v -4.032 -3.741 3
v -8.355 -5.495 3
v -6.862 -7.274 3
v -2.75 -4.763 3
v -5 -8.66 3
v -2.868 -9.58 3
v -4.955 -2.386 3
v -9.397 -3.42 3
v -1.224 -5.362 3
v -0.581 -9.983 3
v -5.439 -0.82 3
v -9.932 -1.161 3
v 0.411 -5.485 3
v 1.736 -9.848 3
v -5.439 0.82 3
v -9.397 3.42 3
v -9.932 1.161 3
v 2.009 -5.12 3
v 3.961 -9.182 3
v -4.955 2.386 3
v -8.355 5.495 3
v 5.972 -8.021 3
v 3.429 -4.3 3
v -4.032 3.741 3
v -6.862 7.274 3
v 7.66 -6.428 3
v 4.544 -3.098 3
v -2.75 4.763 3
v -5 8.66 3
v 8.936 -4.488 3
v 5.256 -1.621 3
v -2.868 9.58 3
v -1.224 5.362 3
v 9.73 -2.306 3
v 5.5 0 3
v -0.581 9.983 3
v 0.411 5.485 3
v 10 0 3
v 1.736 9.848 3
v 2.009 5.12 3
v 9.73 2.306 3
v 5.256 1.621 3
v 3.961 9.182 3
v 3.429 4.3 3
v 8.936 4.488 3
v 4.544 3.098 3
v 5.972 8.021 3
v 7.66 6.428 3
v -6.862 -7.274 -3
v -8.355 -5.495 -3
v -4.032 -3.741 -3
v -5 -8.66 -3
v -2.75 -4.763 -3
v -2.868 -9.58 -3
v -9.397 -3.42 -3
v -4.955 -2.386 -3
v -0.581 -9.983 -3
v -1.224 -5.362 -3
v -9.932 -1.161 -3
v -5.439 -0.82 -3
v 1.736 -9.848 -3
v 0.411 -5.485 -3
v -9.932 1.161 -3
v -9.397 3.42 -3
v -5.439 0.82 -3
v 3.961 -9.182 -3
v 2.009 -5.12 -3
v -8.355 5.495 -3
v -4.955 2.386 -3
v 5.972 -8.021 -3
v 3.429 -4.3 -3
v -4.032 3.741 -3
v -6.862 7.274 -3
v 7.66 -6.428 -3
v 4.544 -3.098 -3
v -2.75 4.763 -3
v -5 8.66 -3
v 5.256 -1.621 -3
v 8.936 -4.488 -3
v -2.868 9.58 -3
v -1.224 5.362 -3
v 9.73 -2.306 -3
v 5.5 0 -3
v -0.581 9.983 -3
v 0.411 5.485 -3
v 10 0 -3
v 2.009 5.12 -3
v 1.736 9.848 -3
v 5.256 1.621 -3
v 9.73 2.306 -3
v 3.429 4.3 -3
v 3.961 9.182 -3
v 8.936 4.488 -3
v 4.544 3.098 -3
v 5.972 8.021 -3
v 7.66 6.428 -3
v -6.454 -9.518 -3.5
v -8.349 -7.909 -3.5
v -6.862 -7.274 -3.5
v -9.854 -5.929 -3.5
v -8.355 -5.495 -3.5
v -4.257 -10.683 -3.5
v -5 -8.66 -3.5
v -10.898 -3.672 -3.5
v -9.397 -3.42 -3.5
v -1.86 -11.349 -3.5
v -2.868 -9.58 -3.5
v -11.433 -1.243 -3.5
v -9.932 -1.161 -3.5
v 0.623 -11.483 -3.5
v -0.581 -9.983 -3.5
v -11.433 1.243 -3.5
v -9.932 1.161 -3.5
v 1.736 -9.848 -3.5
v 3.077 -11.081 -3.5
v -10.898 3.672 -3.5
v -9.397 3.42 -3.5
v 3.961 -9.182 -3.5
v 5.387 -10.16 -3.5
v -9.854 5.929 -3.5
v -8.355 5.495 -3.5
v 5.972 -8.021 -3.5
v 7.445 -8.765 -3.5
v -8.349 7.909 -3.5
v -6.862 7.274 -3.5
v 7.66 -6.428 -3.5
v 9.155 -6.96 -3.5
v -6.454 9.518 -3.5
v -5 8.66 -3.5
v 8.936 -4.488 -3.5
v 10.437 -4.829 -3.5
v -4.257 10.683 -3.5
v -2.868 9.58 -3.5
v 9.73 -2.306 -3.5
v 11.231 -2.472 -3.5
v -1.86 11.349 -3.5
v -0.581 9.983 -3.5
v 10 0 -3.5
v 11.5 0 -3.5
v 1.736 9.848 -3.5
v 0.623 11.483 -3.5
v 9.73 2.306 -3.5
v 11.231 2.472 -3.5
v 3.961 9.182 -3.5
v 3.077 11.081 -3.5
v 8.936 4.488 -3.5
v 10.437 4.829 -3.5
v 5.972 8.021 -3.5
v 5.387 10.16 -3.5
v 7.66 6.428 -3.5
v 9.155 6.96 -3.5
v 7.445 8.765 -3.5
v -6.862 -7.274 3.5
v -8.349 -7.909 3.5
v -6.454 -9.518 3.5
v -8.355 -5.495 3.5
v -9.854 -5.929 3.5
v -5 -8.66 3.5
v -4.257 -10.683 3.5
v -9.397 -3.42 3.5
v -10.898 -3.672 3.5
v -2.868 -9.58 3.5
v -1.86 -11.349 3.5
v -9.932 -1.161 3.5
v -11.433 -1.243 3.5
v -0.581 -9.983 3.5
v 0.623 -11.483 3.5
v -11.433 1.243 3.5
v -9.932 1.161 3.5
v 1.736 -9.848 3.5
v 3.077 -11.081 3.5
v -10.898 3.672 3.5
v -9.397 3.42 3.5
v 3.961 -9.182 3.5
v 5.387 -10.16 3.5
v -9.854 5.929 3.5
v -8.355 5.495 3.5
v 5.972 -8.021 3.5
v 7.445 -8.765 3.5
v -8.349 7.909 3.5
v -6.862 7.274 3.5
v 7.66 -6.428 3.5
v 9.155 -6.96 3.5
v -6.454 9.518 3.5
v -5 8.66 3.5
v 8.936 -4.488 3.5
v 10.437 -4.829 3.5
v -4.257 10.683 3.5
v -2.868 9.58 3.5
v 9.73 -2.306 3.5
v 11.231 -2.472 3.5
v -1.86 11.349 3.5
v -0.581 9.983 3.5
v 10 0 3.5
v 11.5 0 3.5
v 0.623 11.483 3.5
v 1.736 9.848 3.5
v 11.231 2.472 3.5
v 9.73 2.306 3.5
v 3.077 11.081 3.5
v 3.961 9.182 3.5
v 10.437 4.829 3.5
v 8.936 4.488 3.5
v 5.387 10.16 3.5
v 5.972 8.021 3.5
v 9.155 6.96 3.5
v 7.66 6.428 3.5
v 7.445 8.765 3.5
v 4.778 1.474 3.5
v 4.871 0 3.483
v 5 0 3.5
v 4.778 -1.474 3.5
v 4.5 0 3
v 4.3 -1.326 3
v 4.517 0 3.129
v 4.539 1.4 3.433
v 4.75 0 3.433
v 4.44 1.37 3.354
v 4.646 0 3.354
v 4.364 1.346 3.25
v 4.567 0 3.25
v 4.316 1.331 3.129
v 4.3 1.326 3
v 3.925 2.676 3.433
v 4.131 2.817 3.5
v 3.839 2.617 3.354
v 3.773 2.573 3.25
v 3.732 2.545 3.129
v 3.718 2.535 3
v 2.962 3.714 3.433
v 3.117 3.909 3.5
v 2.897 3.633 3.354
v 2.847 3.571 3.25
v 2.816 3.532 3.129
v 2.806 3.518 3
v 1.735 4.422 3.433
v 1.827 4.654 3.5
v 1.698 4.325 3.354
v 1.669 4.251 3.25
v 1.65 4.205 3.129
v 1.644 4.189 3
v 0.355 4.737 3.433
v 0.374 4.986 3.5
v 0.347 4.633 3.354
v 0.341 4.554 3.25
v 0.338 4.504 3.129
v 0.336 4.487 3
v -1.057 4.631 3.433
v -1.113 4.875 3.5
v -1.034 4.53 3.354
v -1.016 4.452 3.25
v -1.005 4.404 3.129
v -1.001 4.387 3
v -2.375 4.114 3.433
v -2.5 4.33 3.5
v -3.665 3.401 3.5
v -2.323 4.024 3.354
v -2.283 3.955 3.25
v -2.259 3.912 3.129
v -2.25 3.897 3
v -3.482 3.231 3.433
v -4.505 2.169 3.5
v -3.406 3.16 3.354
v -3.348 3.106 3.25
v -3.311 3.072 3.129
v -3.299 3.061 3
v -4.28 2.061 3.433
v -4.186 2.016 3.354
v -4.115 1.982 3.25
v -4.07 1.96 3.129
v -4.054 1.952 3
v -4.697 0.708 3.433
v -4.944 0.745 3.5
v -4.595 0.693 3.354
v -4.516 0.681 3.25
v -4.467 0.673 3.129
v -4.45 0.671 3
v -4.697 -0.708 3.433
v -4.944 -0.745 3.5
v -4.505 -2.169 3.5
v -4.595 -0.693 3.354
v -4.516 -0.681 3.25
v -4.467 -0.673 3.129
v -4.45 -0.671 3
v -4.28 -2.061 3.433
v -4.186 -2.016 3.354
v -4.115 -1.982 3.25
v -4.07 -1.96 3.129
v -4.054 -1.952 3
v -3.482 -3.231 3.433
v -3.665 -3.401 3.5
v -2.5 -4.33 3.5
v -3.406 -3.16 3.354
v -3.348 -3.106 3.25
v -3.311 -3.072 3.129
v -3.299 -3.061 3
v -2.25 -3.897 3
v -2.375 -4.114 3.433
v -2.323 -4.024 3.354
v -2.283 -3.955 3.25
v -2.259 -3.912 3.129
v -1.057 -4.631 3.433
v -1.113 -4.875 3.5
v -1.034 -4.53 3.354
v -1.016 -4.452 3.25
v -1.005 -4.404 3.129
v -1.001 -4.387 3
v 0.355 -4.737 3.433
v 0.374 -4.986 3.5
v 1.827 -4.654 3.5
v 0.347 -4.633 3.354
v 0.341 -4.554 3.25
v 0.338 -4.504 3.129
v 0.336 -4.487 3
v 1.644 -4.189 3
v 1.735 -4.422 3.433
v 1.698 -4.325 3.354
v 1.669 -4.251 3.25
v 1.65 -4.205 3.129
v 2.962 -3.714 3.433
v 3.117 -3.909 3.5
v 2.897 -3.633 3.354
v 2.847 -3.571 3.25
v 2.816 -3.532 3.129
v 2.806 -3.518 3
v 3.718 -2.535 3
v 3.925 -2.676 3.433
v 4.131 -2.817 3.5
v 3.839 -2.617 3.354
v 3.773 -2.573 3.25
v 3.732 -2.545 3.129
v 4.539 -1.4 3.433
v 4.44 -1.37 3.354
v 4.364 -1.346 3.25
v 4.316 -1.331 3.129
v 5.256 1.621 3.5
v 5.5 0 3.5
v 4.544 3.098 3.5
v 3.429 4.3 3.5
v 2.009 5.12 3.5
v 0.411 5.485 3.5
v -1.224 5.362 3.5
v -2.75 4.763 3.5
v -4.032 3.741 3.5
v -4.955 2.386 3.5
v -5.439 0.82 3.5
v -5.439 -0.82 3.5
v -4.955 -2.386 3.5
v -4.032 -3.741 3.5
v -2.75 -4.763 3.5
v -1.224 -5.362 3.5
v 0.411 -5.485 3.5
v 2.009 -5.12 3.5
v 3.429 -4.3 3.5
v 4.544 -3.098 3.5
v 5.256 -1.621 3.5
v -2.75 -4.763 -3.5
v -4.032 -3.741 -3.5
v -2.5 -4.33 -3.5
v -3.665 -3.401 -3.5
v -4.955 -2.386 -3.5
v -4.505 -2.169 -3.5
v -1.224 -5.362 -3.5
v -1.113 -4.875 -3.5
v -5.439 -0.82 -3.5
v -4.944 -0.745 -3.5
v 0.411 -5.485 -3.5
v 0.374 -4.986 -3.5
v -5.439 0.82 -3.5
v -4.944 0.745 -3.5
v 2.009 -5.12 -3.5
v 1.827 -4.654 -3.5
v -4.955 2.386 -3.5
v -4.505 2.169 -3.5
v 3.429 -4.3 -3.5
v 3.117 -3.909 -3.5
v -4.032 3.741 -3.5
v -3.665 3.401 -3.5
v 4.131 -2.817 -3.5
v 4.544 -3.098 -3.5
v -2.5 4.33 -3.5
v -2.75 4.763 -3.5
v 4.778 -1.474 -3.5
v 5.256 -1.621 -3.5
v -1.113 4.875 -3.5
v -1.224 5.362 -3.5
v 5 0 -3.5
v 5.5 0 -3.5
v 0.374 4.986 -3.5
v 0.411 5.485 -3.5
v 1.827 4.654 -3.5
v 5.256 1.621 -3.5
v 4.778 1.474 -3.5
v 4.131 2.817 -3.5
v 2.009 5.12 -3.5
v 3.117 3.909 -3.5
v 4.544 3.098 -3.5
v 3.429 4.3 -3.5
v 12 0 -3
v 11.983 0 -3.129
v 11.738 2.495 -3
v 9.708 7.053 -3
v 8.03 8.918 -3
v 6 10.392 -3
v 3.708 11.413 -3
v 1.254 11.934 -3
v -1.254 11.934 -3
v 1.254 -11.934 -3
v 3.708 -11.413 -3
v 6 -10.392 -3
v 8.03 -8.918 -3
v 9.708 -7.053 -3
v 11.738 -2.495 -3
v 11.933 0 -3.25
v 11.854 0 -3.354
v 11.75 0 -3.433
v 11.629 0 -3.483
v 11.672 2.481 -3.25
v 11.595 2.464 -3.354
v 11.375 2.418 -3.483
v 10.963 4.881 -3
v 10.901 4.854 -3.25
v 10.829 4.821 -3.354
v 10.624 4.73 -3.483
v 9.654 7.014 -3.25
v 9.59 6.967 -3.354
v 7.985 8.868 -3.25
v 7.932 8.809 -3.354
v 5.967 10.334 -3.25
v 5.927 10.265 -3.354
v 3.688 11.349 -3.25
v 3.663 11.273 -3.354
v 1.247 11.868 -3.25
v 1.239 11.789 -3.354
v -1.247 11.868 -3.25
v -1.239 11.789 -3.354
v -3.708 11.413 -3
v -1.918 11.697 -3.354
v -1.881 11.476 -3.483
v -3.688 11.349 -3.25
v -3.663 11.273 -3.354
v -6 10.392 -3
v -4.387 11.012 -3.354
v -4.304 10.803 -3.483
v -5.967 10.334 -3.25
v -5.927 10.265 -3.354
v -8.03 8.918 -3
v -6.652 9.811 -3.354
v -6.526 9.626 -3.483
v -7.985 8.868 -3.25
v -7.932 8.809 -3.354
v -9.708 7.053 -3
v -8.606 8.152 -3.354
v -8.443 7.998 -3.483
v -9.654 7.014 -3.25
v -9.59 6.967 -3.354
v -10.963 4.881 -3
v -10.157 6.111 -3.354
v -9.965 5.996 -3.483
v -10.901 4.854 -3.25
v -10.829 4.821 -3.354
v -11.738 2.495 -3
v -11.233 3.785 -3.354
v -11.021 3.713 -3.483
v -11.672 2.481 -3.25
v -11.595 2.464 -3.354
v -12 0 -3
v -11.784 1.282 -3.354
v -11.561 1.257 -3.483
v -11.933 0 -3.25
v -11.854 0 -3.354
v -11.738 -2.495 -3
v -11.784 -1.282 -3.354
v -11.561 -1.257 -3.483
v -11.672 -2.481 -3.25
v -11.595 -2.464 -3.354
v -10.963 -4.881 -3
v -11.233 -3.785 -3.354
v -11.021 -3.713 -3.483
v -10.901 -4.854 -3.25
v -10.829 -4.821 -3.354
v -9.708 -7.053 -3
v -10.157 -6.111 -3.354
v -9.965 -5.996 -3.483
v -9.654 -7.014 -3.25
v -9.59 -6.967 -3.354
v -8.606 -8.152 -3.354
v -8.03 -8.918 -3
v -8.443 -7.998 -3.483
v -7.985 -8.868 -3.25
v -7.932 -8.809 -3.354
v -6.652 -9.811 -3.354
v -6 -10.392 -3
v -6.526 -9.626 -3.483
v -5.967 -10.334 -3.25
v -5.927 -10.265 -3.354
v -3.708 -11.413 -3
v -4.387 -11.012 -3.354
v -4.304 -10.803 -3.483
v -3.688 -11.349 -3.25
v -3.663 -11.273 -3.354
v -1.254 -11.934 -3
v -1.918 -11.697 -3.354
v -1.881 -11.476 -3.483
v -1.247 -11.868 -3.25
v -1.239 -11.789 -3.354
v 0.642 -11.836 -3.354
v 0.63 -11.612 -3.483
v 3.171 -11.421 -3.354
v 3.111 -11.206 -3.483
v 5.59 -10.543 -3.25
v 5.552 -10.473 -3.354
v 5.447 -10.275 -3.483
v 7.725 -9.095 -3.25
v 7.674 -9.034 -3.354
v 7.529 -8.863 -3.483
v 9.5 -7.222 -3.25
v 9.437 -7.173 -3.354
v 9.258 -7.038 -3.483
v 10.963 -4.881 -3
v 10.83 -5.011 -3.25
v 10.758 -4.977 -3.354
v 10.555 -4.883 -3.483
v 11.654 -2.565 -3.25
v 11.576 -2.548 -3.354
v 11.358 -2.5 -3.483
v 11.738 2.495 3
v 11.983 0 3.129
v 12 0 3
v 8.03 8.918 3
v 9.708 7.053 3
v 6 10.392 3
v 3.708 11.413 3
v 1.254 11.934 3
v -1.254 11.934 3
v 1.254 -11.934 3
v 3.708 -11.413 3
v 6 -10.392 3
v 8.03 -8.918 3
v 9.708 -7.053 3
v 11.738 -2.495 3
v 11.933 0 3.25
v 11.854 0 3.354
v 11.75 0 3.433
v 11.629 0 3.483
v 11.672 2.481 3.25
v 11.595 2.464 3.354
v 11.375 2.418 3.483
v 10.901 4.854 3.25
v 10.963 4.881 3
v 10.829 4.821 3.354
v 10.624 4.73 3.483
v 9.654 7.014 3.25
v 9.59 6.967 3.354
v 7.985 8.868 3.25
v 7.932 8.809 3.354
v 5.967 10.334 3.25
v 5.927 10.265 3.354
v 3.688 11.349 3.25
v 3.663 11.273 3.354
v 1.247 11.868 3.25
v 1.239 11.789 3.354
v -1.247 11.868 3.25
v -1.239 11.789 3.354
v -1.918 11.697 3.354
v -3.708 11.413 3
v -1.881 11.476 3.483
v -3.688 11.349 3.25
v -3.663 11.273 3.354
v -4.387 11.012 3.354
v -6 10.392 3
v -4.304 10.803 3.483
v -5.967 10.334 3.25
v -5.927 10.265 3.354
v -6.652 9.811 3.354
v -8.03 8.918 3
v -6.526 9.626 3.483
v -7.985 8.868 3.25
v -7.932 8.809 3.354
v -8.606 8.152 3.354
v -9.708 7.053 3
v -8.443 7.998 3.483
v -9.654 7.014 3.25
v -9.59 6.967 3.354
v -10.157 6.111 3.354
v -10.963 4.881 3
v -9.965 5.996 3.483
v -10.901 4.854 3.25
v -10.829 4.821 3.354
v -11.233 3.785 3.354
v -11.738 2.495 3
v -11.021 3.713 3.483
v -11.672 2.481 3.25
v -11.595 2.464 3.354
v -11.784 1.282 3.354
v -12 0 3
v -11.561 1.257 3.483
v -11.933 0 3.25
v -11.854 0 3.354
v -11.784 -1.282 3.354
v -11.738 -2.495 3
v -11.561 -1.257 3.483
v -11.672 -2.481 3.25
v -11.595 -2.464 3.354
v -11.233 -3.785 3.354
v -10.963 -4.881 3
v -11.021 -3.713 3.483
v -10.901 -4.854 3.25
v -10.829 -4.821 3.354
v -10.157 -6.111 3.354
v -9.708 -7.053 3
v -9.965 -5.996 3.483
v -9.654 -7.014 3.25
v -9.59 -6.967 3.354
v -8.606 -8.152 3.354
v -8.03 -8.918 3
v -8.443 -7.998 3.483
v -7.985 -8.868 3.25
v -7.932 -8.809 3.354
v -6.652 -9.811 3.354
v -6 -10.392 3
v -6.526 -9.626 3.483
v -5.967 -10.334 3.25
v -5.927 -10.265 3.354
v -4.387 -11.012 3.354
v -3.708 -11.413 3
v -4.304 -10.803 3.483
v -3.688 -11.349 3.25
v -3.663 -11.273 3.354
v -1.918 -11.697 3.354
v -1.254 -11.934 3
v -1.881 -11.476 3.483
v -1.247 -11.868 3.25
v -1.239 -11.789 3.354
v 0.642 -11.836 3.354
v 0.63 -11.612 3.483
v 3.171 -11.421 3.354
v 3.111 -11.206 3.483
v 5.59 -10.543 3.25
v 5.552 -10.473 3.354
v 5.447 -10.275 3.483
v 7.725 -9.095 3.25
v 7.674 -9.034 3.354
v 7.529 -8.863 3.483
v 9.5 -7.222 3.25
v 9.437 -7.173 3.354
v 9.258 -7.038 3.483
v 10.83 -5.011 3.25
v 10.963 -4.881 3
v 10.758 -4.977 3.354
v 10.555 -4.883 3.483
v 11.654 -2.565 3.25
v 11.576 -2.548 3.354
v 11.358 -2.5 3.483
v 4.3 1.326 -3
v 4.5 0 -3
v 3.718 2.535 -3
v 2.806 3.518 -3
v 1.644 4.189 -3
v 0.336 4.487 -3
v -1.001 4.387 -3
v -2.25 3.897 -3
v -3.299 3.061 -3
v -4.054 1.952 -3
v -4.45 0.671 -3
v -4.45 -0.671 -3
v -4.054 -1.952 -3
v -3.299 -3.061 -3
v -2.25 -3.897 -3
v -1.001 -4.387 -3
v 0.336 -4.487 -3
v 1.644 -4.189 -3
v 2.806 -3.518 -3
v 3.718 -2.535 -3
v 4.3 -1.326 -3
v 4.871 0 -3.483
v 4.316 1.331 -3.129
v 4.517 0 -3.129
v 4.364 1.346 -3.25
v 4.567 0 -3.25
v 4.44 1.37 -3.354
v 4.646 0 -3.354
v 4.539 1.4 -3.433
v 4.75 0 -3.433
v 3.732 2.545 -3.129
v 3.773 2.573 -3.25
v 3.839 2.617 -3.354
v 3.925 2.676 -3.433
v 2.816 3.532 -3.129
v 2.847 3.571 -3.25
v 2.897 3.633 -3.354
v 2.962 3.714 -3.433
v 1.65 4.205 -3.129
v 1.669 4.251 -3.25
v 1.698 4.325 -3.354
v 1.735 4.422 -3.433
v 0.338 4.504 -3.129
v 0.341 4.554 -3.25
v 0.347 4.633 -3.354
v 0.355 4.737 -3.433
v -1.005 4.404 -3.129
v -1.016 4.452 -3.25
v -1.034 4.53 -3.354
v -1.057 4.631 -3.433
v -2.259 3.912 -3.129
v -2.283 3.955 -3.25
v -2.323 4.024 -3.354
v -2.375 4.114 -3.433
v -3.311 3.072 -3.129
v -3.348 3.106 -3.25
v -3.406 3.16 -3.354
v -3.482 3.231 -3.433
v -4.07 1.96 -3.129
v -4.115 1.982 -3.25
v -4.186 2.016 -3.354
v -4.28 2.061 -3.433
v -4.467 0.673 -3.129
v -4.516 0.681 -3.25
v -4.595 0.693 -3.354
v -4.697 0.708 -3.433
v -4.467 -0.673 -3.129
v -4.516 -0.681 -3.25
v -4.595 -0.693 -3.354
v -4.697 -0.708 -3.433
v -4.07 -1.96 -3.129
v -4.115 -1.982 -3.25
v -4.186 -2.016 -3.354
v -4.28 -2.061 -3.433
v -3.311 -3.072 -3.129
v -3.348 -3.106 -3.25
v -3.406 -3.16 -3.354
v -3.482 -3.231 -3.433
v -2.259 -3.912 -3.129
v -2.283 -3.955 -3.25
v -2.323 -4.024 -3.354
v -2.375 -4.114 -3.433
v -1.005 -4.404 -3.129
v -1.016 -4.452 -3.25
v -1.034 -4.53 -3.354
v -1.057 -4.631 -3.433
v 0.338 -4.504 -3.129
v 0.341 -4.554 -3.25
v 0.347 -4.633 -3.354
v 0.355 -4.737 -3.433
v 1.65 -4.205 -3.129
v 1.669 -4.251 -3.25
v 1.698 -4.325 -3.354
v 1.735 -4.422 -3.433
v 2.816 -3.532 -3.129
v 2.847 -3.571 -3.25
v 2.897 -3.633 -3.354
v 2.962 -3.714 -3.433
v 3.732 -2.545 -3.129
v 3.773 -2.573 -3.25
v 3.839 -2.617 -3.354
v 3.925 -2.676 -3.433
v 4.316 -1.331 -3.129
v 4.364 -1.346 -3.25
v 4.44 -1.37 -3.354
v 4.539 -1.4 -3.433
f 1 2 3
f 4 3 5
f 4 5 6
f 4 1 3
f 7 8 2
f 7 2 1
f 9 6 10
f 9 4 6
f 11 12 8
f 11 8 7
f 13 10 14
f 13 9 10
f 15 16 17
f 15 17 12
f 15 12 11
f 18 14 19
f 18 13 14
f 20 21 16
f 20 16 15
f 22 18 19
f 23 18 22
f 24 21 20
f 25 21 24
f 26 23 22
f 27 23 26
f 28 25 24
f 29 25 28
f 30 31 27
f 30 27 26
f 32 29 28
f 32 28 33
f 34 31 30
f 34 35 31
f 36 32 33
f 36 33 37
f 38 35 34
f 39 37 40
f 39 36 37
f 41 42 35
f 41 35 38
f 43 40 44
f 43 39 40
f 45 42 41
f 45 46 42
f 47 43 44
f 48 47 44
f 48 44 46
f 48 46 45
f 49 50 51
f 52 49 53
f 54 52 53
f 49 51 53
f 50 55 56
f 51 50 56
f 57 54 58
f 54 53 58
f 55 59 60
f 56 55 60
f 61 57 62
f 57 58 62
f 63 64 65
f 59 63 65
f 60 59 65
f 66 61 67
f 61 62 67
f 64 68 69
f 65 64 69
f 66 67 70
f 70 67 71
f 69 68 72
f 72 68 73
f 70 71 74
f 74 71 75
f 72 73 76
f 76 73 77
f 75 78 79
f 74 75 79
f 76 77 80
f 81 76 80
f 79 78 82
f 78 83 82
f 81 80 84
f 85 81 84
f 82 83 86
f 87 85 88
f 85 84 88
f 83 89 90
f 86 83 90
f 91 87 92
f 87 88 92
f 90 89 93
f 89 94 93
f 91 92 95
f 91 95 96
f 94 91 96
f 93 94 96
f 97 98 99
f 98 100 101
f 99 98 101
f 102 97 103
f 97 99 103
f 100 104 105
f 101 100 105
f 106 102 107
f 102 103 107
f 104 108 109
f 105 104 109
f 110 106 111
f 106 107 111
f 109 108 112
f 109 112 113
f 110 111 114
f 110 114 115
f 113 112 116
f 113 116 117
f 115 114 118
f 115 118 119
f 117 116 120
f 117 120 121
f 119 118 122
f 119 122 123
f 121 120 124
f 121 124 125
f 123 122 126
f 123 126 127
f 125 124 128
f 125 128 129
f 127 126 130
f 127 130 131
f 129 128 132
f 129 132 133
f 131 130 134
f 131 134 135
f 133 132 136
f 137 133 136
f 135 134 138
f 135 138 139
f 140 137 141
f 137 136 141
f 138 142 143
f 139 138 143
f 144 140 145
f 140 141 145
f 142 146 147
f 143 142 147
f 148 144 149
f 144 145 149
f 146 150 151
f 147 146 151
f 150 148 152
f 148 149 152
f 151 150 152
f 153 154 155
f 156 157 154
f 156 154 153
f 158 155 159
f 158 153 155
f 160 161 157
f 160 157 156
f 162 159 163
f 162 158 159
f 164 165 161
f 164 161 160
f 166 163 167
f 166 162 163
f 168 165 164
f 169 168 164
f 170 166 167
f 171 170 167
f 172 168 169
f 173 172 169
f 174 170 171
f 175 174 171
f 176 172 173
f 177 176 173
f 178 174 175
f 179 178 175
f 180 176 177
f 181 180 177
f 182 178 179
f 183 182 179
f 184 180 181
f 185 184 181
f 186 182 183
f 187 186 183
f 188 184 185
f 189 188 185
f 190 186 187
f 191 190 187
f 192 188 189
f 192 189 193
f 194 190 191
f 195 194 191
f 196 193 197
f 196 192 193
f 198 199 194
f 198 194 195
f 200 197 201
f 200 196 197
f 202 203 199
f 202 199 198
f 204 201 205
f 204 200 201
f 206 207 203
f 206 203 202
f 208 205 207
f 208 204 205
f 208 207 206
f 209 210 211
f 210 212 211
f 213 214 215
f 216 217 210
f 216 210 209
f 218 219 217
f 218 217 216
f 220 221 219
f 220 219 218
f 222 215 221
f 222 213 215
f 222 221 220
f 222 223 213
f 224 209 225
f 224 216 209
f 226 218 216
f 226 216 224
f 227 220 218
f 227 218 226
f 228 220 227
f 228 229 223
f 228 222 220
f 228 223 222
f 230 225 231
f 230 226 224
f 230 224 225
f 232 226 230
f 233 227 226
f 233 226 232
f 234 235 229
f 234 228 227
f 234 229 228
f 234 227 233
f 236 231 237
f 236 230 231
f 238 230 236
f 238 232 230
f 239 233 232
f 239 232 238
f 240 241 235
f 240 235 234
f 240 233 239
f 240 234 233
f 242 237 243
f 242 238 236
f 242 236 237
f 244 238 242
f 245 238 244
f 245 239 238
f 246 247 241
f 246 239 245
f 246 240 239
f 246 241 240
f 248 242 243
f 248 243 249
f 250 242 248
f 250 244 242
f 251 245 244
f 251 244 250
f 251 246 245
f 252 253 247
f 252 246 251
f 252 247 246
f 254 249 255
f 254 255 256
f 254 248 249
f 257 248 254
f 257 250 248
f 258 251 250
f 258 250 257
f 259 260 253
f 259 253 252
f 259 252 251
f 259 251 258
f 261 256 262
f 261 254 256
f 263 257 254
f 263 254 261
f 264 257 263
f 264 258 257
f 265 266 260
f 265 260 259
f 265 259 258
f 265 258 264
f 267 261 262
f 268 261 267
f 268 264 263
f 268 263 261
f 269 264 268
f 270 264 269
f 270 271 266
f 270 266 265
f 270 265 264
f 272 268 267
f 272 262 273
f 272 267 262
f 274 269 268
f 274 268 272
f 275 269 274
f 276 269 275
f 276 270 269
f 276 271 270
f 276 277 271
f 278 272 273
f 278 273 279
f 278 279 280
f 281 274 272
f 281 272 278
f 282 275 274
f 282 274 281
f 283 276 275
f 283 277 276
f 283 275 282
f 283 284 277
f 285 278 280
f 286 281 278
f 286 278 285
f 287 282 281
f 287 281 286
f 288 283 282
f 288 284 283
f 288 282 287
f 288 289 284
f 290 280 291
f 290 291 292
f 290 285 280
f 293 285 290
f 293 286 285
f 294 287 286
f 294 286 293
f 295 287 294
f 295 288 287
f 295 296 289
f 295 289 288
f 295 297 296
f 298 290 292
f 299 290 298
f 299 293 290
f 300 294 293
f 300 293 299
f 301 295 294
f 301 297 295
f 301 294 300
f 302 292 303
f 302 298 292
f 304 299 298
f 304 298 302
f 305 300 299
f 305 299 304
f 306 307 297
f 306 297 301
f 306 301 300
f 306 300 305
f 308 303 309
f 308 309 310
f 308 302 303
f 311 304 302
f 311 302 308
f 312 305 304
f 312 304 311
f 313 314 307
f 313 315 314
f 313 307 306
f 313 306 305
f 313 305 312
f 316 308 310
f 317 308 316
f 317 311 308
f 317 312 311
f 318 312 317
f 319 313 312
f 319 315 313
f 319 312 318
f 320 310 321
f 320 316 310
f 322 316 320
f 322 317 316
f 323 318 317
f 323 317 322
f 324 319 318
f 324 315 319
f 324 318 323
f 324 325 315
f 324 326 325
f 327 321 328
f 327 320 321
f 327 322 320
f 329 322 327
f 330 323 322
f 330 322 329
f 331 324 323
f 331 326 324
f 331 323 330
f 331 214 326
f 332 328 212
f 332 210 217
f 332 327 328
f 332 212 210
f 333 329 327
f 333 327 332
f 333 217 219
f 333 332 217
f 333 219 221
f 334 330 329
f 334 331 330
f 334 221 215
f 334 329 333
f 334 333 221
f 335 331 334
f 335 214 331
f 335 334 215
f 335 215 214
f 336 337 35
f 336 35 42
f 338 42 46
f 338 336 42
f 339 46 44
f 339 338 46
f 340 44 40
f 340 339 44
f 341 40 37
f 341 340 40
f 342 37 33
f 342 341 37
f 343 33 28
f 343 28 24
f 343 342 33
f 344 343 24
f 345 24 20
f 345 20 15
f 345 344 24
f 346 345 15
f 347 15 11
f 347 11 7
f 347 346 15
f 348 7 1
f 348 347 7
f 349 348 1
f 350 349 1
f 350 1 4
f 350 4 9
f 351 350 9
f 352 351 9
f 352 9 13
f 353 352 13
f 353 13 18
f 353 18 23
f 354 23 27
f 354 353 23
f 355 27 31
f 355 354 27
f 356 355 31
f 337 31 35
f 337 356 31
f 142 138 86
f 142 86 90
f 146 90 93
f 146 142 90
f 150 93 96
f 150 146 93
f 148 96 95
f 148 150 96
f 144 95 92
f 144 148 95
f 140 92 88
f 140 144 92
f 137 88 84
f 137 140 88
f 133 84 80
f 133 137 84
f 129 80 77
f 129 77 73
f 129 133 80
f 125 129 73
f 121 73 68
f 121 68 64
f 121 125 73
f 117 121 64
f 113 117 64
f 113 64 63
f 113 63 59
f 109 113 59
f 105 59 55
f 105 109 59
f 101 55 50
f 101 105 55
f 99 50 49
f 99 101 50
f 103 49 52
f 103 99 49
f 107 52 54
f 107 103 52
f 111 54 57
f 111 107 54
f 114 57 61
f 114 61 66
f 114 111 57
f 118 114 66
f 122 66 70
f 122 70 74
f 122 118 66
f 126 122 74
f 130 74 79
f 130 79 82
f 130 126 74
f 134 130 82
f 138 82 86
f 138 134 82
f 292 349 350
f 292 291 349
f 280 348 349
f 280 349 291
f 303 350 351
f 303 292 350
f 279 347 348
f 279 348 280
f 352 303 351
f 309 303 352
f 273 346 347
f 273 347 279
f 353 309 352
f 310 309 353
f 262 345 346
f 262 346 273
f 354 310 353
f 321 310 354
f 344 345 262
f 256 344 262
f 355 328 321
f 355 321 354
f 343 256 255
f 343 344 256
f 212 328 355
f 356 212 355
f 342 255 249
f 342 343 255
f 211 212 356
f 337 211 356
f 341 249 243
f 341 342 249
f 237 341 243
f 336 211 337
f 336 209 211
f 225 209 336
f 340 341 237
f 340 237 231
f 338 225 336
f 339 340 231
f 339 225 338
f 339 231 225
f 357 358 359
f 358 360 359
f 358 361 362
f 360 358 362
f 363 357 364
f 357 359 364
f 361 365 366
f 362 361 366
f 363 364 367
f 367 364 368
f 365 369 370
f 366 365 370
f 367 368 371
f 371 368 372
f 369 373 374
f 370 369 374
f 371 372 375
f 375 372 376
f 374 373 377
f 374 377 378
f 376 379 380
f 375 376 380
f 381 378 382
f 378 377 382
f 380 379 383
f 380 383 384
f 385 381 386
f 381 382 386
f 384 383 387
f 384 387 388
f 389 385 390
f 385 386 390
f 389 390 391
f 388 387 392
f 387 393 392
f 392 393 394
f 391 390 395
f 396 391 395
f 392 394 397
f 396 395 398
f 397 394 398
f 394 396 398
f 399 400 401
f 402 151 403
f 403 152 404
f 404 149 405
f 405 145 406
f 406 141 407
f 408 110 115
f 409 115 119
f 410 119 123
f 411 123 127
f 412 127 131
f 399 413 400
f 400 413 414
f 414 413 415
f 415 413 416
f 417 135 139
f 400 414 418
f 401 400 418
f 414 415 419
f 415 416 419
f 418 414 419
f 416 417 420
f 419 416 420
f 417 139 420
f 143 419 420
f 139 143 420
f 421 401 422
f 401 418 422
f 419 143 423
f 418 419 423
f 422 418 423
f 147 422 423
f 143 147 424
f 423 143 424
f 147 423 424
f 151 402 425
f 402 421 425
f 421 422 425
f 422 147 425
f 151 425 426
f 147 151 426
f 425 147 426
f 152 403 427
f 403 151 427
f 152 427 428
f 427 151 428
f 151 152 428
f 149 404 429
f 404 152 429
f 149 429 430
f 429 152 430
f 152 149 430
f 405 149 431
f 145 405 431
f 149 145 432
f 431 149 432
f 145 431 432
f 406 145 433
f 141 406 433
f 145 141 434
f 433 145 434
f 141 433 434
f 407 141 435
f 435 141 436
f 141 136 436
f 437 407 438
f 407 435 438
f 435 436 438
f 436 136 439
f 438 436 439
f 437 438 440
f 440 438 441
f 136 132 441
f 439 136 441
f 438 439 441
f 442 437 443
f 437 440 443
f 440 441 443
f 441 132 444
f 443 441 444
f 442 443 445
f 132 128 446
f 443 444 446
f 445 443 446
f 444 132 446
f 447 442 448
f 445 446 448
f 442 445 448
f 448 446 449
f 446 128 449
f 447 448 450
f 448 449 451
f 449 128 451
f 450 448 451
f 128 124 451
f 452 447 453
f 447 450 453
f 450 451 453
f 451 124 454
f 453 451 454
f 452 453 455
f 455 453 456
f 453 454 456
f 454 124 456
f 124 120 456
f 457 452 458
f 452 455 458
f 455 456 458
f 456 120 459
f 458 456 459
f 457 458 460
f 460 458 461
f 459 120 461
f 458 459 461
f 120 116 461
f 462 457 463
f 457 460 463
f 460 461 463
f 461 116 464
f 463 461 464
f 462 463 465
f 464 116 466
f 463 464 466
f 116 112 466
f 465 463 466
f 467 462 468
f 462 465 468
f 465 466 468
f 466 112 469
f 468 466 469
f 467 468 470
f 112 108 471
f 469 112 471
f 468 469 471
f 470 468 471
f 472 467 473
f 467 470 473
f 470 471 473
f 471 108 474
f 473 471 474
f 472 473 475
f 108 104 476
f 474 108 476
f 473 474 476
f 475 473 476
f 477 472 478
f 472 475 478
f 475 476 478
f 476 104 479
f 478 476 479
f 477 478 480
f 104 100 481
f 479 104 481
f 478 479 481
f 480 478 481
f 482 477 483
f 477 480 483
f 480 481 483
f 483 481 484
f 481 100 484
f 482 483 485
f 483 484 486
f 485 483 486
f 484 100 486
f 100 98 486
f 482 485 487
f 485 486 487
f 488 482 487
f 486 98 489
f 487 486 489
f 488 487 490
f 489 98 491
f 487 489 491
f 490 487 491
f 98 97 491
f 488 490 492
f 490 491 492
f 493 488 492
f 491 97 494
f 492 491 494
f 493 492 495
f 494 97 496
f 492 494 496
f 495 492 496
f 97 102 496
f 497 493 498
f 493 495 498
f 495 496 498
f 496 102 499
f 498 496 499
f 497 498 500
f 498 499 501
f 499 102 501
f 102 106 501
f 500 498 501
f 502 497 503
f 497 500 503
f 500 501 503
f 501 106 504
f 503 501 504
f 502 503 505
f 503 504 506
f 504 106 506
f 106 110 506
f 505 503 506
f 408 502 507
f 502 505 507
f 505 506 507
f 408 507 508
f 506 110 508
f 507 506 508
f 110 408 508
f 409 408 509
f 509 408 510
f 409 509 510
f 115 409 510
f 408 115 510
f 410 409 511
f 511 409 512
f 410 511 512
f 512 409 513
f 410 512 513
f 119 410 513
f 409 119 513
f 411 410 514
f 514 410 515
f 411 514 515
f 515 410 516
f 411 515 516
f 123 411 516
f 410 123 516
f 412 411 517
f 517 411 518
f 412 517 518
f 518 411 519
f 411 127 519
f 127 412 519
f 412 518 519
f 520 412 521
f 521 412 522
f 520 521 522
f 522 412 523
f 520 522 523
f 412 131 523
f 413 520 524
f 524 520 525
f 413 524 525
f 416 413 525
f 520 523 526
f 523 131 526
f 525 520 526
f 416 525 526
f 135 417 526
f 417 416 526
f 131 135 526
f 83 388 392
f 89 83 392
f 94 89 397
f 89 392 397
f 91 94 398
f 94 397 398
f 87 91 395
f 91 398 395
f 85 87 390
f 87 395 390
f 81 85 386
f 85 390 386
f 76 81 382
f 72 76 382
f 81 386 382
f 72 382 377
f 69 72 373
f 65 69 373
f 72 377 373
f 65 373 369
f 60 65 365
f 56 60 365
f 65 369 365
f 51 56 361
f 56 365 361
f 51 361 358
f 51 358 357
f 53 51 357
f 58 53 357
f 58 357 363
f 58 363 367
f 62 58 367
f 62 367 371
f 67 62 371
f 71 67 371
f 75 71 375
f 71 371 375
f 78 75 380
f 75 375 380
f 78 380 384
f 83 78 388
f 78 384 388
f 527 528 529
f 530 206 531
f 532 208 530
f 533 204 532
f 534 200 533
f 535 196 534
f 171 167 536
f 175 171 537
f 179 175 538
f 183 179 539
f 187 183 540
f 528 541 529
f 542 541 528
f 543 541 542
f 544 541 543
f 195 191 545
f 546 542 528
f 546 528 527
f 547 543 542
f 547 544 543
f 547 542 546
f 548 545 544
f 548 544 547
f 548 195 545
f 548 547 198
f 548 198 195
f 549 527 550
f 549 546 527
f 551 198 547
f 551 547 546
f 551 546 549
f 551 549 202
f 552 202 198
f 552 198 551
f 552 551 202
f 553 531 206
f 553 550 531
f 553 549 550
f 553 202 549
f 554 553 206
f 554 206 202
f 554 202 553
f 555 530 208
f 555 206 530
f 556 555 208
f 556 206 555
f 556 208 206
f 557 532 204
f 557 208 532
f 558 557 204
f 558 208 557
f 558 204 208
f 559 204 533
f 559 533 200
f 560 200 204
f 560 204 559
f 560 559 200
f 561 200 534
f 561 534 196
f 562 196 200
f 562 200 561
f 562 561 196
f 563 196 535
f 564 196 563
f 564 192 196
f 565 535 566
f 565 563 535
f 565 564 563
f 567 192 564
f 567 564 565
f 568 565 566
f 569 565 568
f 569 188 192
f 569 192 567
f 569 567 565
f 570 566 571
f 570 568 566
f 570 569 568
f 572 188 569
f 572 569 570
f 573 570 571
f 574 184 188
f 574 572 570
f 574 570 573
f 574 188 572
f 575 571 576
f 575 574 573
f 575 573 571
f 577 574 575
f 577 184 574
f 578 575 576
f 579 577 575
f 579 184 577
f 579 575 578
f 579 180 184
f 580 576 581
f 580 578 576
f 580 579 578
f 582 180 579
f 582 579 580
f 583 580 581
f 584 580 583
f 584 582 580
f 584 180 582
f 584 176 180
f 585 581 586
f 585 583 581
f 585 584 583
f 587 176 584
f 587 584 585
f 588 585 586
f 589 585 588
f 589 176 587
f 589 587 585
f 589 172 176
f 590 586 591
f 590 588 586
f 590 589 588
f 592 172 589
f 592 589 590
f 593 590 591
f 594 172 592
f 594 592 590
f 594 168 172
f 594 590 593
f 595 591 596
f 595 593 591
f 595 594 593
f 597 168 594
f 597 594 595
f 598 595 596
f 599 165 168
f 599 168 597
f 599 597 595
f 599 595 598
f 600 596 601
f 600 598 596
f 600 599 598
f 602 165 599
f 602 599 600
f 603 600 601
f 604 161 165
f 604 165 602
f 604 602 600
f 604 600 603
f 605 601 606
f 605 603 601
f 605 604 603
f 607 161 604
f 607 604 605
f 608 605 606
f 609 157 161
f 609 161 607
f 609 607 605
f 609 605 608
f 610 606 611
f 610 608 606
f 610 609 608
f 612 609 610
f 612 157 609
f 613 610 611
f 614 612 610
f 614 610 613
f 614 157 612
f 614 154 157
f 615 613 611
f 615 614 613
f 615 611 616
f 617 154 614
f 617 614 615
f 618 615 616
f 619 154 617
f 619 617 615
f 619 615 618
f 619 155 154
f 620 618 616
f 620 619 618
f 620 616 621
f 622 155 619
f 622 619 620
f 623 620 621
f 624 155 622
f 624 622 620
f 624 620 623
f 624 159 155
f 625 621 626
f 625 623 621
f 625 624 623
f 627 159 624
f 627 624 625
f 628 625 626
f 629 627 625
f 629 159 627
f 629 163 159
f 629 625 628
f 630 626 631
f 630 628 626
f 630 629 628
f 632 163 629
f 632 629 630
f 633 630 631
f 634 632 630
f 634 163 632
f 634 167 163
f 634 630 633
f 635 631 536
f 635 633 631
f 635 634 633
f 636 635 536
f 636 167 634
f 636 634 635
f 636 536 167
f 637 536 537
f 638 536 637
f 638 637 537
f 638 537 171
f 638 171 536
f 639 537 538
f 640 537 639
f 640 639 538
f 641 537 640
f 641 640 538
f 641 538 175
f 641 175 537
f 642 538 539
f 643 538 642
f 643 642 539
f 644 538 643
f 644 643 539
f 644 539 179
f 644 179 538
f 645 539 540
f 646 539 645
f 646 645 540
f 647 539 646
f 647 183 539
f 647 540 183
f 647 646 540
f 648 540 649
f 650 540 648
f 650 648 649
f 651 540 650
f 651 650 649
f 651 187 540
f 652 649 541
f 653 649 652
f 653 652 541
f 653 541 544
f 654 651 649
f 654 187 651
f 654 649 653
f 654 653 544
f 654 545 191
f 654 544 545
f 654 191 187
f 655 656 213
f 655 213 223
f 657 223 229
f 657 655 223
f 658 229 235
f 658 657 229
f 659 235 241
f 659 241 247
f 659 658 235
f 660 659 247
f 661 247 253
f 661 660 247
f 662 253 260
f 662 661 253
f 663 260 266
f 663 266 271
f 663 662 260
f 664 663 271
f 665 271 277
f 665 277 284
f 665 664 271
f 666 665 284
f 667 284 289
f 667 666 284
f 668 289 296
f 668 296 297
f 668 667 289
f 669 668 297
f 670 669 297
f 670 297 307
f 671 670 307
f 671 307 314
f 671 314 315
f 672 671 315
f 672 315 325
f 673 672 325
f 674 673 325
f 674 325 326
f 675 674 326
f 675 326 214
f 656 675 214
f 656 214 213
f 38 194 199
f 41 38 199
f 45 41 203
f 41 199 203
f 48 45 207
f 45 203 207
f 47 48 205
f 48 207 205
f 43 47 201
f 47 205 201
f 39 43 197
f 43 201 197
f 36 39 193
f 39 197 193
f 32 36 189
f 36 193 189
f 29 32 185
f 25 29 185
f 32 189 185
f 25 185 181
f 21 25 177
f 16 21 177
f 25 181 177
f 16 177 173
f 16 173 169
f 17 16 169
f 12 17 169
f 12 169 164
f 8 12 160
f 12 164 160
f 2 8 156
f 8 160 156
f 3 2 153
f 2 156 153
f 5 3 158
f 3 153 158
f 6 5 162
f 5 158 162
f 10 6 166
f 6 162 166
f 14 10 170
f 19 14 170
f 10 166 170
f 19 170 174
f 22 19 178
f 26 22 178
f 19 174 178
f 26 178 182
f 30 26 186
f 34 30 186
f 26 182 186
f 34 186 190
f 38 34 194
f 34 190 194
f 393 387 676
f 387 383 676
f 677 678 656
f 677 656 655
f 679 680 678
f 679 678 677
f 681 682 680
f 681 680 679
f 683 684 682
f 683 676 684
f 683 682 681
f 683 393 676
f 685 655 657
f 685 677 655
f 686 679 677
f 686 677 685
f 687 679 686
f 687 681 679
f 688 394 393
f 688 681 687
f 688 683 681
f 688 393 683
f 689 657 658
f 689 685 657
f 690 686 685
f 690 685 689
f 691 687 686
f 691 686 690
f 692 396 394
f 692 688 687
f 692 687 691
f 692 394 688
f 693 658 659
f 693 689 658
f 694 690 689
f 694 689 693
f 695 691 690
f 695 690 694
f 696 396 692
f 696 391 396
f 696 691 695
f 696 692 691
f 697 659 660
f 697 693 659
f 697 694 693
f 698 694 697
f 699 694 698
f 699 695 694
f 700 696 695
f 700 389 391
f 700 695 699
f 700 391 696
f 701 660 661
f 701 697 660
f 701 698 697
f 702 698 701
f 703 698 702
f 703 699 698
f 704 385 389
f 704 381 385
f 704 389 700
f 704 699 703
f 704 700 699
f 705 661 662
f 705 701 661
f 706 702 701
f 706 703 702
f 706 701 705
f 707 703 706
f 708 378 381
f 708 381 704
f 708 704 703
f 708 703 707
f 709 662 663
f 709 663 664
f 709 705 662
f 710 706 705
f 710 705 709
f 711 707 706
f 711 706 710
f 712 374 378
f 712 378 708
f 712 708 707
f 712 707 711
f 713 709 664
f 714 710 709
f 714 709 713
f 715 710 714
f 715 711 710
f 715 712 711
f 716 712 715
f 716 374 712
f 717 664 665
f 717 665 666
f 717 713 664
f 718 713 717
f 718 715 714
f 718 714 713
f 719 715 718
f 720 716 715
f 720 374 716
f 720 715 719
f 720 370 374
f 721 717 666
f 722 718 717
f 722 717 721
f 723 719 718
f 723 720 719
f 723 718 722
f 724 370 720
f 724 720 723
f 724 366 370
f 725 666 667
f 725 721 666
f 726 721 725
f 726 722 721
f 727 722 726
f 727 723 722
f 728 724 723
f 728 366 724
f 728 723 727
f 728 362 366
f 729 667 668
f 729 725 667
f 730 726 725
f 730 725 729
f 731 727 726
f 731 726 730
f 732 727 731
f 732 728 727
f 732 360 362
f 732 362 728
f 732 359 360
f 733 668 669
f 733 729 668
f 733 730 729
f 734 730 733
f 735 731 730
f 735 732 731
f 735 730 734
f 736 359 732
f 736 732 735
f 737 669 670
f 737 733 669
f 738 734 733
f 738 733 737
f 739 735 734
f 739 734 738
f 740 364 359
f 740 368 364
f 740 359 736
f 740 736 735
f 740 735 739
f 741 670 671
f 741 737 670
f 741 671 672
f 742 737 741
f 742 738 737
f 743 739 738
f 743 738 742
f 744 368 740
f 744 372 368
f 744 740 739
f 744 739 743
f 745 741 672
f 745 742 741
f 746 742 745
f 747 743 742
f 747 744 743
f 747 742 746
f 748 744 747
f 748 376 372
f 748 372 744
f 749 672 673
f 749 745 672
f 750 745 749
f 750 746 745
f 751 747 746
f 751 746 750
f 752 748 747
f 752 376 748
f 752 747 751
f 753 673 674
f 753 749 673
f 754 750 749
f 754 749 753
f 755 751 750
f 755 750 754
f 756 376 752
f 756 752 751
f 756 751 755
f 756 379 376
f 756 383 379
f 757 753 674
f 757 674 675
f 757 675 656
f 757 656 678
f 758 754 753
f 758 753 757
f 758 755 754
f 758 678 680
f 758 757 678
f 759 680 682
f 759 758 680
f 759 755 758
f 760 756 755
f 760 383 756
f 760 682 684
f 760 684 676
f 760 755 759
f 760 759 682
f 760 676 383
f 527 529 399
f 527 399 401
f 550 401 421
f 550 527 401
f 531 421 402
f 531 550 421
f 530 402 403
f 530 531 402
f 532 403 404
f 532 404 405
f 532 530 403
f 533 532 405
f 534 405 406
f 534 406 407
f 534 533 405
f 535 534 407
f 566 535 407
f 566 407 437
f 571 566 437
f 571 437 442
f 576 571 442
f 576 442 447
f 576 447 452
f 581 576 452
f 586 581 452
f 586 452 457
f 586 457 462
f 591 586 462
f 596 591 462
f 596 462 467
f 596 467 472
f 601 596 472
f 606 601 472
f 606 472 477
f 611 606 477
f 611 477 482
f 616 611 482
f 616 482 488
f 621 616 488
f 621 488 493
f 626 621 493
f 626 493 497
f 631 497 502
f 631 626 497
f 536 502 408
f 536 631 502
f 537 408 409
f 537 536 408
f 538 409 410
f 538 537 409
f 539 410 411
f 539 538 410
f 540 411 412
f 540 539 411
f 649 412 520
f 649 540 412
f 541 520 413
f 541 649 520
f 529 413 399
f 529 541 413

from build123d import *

# Parameters (mm, degrees)
SKETCH1_R           = 12
SKETCH1_R_2         = 4.5
BOSS_EXTRUDE1_DEPTH = 3.5
FILLET1_R           = 0.5
SKETCH2_R           = 10
SKETCH2_R_2         = 5.5
CUT_EXTRUDE1_DEPTH  = 0.5


with BuildPart() as part:
    # Sketch1 → Boss-Extrude1 (new, symmetric)
    with BuildSketch(Plane.XY):
        Circle(SKETCH1_R)
        Circle(SKETCH1_R_2, mode=Mode.SUBTRACT)
    extrude(amount=BOSS_EXTRUDE1_DEPTH, both=True)

    # Fillet1
    fillet1_edges = [part.edges().sort_by_distance(p)[0] for p in [
        (-12, 0, -3.5),
        (-12, 0, 3.5),
        (-4.5, 0, -3.5),
        (-4.5, 0, 3.5),
    ]]
    fillet(fillet1_edges, radius=FILLET1_R)

    # Sketch2 → Cut-Extrude1 (cut)
    with BuildSketch(Plane.XY.offset(3.5)):
        Circle(SKETCH2_R)
        Circle(SKETCH2_R_2, mode=Mode.SUBTRACT)
    cut_extrude1 = extrude(amount=-CUT_EXTRUDE1_DEPTH, mode=Mode.SUBTRACT)

    # Mirror1: Cut-Extrude1 across plane
    add(cut_extrude1.mirror(Plane.XY), mode=Mode.SUBTRACT)


solid = part.part
